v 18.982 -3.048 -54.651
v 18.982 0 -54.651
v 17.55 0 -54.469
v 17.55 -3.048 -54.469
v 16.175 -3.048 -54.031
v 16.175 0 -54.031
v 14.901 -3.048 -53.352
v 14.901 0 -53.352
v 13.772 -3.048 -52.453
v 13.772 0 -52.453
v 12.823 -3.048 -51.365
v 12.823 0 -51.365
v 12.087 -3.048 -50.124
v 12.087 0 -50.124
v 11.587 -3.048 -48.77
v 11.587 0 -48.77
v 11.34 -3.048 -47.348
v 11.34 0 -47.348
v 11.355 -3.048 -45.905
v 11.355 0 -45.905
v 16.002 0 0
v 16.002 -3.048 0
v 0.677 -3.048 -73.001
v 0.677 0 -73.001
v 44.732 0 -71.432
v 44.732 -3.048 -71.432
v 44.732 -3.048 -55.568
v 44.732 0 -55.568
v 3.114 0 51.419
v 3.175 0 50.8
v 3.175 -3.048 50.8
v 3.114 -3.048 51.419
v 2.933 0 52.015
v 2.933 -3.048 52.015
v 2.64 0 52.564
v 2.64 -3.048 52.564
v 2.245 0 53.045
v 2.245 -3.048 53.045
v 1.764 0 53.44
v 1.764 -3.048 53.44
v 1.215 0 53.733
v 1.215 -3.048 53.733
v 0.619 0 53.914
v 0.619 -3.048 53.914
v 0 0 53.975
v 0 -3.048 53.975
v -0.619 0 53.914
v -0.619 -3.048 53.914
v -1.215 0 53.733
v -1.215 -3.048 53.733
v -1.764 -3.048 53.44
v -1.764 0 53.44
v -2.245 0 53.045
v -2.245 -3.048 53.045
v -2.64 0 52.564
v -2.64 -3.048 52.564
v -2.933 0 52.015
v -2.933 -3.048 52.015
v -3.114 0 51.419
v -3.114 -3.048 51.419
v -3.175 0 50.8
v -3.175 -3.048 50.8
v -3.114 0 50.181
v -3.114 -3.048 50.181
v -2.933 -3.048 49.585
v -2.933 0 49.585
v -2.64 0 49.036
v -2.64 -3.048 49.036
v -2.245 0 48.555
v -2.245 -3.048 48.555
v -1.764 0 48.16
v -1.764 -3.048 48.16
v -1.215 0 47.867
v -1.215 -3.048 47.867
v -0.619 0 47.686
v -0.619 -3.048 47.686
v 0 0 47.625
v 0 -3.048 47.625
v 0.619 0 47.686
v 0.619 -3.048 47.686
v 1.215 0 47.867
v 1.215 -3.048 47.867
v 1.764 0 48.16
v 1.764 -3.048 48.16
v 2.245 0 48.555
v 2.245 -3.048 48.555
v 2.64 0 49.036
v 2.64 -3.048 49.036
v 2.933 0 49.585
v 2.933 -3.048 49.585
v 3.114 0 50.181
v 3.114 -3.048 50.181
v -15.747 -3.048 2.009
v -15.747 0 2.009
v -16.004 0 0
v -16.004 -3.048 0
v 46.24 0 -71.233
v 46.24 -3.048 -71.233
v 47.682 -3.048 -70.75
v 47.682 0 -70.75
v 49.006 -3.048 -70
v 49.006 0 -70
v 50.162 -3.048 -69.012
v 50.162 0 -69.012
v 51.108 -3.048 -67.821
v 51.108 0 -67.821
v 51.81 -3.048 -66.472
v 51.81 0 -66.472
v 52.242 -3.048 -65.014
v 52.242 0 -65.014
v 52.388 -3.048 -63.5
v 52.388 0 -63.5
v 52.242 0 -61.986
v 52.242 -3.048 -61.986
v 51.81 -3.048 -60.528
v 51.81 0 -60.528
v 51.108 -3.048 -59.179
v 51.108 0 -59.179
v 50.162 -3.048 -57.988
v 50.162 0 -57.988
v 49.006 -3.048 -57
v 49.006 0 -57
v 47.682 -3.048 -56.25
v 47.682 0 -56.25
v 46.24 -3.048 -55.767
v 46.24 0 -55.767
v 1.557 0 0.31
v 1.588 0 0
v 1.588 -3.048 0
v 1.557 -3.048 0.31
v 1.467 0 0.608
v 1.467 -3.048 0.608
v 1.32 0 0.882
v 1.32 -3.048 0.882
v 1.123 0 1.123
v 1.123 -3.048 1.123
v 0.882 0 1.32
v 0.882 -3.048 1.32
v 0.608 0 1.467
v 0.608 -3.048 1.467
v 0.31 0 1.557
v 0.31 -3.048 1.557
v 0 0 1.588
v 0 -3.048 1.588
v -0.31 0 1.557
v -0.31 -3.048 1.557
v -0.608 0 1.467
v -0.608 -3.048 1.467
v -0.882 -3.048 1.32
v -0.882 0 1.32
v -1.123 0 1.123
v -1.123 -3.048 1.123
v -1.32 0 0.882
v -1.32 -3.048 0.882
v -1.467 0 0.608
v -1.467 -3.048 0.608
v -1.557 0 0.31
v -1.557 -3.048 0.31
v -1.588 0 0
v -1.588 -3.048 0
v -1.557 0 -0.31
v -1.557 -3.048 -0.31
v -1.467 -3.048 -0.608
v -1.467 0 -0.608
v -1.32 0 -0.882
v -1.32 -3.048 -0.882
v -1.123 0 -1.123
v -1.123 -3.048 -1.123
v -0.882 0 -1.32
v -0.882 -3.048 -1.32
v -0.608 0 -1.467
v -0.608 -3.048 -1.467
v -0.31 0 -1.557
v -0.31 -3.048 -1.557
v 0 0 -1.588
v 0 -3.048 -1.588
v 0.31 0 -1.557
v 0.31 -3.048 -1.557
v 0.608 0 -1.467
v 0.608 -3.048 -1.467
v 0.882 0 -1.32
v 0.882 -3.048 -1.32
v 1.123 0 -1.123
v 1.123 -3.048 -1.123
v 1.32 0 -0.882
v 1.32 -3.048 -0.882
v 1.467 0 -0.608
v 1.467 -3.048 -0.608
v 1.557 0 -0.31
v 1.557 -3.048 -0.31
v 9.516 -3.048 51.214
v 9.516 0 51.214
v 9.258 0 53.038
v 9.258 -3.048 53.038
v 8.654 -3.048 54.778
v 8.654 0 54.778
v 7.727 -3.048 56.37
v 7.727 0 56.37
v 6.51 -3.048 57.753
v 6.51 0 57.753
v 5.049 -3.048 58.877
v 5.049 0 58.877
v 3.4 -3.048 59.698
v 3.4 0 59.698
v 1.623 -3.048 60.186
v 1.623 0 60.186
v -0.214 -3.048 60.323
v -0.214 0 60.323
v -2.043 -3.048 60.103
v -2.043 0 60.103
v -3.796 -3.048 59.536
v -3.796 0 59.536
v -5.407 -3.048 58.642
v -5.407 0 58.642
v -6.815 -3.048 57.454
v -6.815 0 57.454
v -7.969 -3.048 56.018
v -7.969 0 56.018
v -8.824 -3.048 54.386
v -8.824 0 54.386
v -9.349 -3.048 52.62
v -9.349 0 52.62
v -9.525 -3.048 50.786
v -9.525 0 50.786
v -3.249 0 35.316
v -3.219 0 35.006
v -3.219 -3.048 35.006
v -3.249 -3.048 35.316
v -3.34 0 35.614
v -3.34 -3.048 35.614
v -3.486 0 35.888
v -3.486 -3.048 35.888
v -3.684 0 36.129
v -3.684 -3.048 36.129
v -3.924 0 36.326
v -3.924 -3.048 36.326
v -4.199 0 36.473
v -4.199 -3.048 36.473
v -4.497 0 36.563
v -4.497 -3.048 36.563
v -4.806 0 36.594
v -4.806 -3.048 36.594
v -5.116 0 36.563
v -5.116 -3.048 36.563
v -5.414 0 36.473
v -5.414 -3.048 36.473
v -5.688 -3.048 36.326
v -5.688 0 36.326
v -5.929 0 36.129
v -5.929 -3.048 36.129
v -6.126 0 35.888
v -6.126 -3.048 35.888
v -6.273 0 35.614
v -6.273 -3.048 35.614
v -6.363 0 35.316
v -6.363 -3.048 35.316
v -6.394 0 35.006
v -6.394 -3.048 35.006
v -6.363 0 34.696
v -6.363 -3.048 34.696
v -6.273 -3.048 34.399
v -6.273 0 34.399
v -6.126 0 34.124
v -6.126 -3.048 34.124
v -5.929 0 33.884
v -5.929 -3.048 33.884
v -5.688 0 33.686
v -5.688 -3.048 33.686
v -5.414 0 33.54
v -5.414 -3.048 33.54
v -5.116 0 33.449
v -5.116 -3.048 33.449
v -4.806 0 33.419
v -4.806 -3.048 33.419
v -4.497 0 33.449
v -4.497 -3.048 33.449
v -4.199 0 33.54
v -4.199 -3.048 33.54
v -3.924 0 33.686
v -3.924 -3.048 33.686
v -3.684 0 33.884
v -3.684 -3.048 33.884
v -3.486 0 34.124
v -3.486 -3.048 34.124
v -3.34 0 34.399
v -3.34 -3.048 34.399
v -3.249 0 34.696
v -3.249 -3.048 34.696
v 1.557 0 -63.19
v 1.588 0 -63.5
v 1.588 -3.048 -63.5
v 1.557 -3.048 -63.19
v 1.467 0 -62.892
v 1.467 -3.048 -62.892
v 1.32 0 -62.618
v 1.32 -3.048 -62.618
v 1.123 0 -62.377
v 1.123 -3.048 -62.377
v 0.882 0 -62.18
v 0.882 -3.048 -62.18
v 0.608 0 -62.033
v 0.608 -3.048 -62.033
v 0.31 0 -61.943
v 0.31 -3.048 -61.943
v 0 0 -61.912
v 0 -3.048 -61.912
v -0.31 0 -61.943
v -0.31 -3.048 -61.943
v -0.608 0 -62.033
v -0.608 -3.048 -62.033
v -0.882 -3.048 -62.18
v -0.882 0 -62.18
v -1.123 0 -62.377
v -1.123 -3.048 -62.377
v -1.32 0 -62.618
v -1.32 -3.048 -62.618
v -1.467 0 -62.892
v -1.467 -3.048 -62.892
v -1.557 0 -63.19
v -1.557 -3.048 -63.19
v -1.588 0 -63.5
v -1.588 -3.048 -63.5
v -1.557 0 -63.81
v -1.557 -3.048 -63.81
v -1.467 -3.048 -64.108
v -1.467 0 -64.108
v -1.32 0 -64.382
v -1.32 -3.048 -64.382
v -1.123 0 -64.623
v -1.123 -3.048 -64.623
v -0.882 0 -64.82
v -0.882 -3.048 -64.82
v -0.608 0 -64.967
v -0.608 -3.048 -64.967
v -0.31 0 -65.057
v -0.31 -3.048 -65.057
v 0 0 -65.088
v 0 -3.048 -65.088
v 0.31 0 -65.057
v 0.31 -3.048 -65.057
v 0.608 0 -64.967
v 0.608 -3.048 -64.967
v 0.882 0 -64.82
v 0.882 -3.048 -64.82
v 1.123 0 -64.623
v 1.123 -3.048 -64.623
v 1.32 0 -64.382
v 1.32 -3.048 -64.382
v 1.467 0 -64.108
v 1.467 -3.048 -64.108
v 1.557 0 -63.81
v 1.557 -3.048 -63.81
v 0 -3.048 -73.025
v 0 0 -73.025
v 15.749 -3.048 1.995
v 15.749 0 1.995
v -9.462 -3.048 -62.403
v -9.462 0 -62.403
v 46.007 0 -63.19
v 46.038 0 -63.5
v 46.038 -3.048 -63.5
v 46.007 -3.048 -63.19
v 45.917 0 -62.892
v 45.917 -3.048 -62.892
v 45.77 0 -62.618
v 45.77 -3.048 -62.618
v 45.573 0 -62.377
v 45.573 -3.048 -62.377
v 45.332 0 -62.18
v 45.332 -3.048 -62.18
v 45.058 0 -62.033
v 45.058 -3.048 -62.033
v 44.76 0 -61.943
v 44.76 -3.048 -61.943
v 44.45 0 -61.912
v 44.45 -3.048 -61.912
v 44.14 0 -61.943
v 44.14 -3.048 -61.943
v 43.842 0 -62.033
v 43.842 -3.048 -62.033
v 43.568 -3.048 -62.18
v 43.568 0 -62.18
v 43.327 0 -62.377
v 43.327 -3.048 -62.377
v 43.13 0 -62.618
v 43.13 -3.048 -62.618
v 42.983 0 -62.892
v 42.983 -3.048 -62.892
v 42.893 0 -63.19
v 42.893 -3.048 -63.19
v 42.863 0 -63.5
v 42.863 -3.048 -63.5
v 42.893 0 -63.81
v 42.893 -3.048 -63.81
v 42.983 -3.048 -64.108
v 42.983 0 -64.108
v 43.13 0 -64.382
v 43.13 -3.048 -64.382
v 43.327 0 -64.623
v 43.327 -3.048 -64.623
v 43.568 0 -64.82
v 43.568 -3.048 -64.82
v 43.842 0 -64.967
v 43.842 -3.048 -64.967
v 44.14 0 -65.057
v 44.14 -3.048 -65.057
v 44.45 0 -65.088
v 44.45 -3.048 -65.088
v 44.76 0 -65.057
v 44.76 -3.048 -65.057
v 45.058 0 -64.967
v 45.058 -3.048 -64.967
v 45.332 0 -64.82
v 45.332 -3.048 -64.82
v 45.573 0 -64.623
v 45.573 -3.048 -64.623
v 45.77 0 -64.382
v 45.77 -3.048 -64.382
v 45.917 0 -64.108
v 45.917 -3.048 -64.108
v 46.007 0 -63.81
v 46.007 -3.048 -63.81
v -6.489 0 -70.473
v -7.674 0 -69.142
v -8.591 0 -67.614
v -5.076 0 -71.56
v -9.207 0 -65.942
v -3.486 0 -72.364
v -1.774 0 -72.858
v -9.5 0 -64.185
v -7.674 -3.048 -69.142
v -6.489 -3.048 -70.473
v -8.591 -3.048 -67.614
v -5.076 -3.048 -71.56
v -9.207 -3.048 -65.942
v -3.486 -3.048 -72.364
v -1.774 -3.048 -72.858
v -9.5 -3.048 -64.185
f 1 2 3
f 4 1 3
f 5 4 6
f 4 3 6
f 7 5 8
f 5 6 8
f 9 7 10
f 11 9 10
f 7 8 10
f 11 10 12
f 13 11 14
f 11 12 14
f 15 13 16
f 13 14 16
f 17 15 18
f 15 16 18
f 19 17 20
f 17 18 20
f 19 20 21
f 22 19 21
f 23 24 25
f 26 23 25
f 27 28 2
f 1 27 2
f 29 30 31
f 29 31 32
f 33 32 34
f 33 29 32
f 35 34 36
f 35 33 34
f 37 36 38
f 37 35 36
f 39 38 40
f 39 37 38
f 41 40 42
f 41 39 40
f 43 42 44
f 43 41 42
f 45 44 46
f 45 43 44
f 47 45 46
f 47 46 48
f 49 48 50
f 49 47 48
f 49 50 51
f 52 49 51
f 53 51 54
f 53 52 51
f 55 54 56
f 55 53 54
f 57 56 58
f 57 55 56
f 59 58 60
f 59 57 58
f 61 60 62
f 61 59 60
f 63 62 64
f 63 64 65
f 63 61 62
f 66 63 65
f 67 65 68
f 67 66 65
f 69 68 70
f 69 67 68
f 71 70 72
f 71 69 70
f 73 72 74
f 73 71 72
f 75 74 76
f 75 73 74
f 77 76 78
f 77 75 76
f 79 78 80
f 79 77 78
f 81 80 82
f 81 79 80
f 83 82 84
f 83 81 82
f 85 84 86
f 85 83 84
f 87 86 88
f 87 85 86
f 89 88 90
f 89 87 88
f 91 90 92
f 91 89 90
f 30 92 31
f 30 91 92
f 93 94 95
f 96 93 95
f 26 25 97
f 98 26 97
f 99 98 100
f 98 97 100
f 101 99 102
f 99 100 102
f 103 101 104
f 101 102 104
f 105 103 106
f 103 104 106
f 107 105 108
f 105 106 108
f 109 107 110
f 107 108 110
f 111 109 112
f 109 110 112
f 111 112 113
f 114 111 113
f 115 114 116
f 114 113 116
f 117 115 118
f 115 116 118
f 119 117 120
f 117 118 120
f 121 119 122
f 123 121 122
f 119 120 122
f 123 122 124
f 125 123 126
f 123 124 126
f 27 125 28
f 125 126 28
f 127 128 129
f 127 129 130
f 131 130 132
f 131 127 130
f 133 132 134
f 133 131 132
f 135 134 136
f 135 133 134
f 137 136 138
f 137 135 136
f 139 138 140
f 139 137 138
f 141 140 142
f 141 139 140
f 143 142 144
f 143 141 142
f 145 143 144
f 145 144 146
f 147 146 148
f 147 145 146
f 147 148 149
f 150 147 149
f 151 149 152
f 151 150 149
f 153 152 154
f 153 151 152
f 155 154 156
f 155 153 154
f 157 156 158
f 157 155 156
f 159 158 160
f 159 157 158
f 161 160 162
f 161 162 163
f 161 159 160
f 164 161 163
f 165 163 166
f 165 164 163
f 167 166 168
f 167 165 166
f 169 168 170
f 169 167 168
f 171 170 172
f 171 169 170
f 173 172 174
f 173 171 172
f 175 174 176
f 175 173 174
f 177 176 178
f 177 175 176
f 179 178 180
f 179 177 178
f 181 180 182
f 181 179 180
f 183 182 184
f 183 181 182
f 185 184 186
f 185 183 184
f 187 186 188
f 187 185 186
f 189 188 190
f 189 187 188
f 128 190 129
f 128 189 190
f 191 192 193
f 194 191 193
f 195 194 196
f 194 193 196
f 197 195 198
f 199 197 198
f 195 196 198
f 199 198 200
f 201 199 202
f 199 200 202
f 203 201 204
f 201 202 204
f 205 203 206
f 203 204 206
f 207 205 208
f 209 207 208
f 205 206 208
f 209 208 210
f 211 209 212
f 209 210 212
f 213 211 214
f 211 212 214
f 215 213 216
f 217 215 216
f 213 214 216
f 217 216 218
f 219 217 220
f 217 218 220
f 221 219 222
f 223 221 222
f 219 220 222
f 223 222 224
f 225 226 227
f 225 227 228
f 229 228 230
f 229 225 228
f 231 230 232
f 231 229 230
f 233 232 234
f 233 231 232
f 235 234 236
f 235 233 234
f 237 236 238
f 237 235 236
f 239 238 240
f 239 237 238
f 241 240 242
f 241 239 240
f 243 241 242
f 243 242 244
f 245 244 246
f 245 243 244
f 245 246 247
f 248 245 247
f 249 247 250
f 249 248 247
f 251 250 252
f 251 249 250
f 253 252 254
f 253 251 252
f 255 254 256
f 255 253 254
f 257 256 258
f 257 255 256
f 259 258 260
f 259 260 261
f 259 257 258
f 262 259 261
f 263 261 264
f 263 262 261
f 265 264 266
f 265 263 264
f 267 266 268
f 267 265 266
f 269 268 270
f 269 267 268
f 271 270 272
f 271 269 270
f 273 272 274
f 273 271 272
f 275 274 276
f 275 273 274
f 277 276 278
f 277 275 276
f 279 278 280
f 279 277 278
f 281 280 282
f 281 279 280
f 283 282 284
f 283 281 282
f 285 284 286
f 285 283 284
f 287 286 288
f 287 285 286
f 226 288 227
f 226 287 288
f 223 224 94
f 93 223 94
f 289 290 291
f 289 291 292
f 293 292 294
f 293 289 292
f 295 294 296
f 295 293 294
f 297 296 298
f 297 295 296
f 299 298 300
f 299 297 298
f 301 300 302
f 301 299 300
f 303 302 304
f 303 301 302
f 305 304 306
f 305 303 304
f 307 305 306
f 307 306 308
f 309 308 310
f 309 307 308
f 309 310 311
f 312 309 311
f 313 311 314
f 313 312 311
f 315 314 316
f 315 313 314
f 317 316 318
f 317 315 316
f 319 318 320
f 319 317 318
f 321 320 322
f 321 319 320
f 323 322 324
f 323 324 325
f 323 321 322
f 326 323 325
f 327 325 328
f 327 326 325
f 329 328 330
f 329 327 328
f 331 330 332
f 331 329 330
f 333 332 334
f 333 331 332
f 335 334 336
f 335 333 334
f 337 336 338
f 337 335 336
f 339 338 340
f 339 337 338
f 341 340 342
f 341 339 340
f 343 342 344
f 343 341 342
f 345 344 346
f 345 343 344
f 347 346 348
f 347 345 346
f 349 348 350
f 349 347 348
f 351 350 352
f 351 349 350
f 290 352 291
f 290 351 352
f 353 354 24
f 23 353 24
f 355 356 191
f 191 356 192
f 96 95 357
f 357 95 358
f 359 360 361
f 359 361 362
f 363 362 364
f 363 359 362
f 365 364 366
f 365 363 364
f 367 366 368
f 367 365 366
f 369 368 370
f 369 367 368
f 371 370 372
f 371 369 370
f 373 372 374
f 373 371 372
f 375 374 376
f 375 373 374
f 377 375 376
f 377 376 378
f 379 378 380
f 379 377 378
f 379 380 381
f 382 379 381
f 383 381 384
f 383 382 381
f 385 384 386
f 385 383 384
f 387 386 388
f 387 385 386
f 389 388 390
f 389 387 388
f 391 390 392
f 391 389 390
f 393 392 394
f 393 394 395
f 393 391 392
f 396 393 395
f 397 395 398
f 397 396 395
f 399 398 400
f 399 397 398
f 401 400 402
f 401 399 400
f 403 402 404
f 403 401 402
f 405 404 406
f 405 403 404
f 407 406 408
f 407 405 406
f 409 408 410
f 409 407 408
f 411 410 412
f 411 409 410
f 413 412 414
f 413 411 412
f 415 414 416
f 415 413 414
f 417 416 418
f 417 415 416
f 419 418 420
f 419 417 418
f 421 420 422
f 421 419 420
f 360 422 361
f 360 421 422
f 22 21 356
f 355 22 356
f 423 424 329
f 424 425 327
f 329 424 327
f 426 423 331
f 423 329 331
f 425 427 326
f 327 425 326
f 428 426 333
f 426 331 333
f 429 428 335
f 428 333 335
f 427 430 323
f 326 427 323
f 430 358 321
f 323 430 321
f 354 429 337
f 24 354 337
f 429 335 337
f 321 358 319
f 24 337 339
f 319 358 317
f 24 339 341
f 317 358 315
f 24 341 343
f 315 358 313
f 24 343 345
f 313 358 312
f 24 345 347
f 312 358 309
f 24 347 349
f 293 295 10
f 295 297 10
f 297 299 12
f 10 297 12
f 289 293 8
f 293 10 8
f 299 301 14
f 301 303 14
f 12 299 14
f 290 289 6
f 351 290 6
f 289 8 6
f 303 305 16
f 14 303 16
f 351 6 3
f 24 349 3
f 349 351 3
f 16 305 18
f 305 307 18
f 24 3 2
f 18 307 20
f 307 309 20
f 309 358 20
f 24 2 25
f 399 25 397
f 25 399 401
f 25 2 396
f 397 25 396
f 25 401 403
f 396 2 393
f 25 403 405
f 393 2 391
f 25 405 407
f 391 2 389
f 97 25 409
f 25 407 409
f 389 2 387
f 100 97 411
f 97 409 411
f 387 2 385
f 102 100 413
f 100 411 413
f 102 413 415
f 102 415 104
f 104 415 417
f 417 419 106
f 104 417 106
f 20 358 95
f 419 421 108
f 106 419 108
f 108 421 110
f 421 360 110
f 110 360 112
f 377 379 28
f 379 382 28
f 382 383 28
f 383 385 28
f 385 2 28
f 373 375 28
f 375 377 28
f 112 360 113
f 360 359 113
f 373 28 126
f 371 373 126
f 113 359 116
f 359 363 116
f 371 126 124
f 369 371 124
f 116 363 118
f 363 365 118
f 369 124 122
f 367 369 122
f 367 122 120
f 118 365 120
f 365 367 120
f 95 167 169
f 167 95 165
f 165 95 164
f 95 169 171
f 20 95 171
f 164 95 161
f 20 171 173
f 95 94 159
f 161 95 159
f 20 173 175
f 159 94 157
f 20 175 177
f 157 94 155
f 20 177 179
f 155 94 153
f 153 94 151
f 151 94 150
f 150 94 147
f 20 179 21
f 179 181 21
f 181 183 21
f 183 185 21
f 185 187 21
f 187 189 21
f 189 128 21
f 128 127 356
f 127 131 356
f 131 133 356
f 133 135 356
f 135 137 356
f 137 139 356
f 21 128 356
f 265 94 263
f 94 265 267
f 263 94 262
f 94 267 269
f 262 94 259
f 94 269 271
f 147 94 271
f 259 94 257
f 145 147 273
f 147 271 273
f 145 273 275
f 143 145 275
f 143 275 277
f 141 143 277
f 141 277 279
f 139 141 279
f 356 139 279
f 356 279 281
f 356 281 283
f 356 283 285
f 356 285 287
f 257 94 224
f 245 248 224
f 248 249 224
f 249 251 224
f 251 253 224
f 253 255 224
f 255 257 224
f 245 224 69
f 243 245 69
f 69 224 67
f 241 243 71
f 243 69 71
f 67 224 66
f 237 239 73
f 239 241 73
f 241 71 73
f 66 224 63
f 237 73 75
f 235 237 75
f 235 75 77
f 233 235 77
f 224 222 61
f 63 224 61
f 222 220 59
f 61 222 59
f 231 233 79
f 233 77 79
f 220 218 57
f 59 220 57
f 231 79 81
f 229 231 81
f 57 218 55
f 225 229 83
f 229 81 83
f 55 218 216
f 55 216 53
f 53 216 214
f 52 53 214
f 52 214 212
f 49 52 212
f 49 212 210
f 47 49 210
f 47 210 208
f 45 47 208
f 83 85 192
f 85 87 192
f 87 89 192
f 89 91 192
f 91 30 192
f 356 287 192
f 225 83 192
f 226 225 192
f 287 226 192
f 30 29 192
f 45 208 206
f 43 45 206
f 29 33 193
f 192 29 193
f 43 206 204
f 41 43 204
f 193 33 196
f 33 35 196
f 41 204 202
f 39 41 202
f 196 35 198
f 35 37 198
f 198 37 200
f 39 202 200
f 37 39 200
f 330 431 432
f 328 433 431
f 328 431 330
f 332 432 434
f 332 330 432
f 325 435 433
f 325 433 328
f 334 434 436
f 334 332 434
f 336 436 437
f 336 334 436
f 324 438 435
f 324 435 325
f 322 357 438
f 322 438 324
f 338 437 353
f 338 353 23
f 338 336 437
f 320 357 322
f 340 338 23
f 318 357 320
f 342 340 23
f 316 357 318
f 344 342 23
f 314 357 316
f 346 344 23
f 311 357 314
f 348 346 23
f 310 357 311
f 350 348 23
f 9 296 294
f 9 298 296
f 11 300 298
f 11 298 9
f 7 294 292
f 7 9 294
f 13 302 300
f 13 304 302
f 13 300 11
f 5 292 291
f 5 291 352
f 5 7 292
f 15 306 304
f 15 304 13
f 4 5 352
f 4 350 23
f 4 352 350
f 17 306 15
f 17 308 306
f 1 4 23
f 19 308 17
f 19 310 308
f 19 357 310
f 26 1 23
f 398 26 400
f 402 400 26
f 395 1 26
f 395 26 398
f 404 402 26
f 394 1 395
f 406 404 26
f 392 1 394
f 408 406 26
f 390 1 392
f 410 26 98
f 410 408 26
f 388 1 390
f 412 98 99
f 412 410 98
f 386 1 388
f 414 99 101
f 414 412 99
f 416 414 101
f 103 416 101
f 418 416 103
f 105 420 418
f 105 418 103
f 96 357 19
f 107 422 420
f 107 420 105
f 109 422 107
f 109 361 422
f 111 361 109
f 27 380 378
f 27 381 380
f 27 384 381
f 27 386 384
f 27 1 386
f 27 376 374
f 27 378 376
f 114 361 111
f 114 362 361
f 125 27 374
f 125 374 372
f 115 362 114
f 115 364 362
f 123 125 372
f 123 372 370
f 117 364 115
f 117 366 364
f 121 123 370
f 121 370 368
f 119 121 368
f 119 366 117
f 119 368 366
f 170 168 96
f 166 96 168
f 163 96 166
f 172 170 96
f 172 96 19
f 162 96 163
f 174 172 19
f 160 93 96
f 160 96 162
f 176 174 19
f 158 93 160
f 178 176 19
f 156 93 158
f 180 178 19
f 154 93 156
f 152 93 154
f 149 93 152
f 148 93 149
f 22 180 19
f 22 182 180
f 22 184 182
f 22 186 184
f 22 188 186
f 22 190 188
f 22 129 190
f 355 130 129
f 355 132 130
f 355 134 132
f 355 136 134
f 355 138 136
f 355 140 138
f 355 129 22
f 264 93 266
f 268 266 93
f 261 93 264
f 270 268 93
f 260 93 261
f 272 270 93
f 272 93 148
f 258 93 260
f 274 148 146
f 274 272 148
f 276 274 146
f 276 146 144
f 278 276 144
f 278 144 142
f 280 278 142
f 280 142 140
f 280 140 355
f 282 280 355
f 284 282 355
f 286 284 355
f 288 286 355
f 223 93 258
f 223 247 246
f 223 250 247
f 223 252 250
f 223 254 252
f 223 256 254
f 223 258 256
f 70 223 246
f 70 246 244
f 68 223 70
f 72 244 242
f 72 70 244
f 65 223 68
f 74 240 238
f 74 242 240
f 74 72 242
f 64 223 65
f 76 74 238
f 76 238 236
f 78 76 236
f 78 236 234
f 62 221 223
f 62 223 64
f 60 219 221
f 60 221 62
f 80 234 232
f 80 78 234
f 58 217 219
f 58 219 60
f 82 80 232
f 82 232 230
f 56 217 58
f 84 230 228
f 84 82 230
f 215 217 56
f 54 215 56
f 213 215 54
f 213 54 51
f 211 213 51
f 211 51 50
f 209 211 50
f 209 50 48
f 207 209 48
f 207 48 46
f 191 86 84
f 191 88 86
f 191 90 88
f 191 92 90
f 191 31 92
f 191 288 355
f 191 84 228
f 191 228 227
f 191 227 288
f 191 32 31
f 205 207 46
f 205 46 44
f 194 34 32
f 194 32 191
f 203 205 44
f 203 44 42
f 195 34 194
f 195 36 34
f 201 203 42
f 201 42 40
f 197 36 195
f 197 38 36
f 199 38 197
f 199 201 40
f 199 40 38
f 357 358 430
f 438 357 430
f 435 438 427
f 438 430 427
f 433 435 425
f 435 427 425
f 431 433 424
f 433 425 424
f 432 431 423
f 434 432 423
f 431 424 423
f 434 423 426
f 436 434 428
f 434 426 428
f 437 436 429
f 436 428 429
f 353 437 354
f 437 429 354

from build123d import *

# Parameters (mm, degrees)
F0_R     = 1.5875
F0_R_2   = 3.175
F1_DEPTH = 3.048


with BuildPart() as f1:
    # F0 (on Front) → F1 (new body)
    with BuildSketch(Plane.XZ):
        with BuildLine():
            ThreePointArc((9.516015, 51.213634), (9.522753, 51.006866), (9.525, 50.8))
            ThreePointArc((9.525, 50.8), (0.006912, 41.275003), (-9.52499, 50.786176))
            Line((-9.52499, 50.786176), (-15.747385, 2.008853))
            ThreePointArc((-15.747385, 2.008853), (0.007231, 15.874998), (15.749209, 1.994506))
            Line((15.749209, 1.994506), (9.516015, 51.213634))
        make_face()
        with Locations((-4.806304, 35.006166)):
            Circle(F0_R, mode=Mode.SUBTRACT)
        with BuildLine():
            ThreePointArc((-9.52499, 50.786176), (0.006912, 41.275003), (9.525, 50.8))
            ThreePointArc((9.525, 50.8), (9.522753, 51.006866), (9.516015, 51.213634))
            ThreePointArc((9.516015, 51.213634), (-0.213776, 60.322601), (-9.52499, 50.786176))
        make_face()
        with Locations((0, 50.8)):
            Circle(F0_R_2, mode=Mode.SUBTRACT)
        with BuildLine():
            ThreePointArc((15.875, 0), (15.843521, 0.999235), (15.749209, 1.994506))
            ThreePointArc((15.749209, 1.994506), (0.007231, 15.874998), (-15.747385, 2.008853))
            ThreePointArc((-15.747385, 2.008853), (-1.006451, -15.843064), (15.875, 0))
        make_face()
        Circle(F0_R, mode=Mode.SUBTRACT)
        with BuildLine():
            Line((16.001796, 0), (15.749209, 1.994506))
            ThreePointArc((15.749209, 1.994506), (15.843521, 0.999235), (15.875, 0))
            ThreePointArc((15.875, 0), (-1.006451, -15.843064), (-15.747385, 2.008853))
            Line((-15.747385, 2.008853), (-16.003649, 0))
            Line((-16.003649, 0), (-9.461613, -62.40296))
            ThreePointArc((-9.461613, -62.40296), (0.549435, -53.99086), (9.525, -63.5))
            ThreePointArc((9.525, -63.5), (6.970557, -69.991299), (0.677344, -73.000886))
            Line((0.677344, -73.000886), (44.732405, -71.432475))
            ThreePointArc((44.732405, -71.432475), (36.5125, -63.5), (44.732405, -55.567525))
            Line((44.732405, -55.567525), (18.981753, -54.650772))
            ThreePointArc((18.981753, -54.650772), (13.27275, -51.930861), (11.354835, -45.904898))
            Line((11.354835, -45.904898), (16.001796, 0))
        make_face()
        with BuildLine():
            ThreePointArc((9.525, -63.5), (0.549435, -53.99086), (-9.461613, -62.40296))
            ThreePointArc((-9.461613, -62.40296), (-7.112487, -69.835468), (0, -73.025))
            Line((0, -73.025), (0.677344, -73.000886))
            ThreePointArc((0.677344, -73.000886), (6.970557, -69.991299), (9.525, -63.5))
        make_face()
        with Locations((0, -63.5)):
            Circle(F0_R, mode=Mode.SUBTRACT)
        with BuildLine():
            ThreePointArc((52.3875, -63.5), (50.161633, -57.98809), (44.732405, -55.567525))
            ThreePointArc((44.732405, -55.567525), (36.5125, -63.5), (44.732405, -71.432475))
            ThreePointArc((44.732405, -71.432475), (50.161633, -69.01191), (52.3875, -63.5))
        make_face()
        with Locations((44.45, -63.5)):
            Circle(F0_R, mode=Mode.SUBTRACT)
    extrude(amount=F1_DEPTH)


solid = f1.part
